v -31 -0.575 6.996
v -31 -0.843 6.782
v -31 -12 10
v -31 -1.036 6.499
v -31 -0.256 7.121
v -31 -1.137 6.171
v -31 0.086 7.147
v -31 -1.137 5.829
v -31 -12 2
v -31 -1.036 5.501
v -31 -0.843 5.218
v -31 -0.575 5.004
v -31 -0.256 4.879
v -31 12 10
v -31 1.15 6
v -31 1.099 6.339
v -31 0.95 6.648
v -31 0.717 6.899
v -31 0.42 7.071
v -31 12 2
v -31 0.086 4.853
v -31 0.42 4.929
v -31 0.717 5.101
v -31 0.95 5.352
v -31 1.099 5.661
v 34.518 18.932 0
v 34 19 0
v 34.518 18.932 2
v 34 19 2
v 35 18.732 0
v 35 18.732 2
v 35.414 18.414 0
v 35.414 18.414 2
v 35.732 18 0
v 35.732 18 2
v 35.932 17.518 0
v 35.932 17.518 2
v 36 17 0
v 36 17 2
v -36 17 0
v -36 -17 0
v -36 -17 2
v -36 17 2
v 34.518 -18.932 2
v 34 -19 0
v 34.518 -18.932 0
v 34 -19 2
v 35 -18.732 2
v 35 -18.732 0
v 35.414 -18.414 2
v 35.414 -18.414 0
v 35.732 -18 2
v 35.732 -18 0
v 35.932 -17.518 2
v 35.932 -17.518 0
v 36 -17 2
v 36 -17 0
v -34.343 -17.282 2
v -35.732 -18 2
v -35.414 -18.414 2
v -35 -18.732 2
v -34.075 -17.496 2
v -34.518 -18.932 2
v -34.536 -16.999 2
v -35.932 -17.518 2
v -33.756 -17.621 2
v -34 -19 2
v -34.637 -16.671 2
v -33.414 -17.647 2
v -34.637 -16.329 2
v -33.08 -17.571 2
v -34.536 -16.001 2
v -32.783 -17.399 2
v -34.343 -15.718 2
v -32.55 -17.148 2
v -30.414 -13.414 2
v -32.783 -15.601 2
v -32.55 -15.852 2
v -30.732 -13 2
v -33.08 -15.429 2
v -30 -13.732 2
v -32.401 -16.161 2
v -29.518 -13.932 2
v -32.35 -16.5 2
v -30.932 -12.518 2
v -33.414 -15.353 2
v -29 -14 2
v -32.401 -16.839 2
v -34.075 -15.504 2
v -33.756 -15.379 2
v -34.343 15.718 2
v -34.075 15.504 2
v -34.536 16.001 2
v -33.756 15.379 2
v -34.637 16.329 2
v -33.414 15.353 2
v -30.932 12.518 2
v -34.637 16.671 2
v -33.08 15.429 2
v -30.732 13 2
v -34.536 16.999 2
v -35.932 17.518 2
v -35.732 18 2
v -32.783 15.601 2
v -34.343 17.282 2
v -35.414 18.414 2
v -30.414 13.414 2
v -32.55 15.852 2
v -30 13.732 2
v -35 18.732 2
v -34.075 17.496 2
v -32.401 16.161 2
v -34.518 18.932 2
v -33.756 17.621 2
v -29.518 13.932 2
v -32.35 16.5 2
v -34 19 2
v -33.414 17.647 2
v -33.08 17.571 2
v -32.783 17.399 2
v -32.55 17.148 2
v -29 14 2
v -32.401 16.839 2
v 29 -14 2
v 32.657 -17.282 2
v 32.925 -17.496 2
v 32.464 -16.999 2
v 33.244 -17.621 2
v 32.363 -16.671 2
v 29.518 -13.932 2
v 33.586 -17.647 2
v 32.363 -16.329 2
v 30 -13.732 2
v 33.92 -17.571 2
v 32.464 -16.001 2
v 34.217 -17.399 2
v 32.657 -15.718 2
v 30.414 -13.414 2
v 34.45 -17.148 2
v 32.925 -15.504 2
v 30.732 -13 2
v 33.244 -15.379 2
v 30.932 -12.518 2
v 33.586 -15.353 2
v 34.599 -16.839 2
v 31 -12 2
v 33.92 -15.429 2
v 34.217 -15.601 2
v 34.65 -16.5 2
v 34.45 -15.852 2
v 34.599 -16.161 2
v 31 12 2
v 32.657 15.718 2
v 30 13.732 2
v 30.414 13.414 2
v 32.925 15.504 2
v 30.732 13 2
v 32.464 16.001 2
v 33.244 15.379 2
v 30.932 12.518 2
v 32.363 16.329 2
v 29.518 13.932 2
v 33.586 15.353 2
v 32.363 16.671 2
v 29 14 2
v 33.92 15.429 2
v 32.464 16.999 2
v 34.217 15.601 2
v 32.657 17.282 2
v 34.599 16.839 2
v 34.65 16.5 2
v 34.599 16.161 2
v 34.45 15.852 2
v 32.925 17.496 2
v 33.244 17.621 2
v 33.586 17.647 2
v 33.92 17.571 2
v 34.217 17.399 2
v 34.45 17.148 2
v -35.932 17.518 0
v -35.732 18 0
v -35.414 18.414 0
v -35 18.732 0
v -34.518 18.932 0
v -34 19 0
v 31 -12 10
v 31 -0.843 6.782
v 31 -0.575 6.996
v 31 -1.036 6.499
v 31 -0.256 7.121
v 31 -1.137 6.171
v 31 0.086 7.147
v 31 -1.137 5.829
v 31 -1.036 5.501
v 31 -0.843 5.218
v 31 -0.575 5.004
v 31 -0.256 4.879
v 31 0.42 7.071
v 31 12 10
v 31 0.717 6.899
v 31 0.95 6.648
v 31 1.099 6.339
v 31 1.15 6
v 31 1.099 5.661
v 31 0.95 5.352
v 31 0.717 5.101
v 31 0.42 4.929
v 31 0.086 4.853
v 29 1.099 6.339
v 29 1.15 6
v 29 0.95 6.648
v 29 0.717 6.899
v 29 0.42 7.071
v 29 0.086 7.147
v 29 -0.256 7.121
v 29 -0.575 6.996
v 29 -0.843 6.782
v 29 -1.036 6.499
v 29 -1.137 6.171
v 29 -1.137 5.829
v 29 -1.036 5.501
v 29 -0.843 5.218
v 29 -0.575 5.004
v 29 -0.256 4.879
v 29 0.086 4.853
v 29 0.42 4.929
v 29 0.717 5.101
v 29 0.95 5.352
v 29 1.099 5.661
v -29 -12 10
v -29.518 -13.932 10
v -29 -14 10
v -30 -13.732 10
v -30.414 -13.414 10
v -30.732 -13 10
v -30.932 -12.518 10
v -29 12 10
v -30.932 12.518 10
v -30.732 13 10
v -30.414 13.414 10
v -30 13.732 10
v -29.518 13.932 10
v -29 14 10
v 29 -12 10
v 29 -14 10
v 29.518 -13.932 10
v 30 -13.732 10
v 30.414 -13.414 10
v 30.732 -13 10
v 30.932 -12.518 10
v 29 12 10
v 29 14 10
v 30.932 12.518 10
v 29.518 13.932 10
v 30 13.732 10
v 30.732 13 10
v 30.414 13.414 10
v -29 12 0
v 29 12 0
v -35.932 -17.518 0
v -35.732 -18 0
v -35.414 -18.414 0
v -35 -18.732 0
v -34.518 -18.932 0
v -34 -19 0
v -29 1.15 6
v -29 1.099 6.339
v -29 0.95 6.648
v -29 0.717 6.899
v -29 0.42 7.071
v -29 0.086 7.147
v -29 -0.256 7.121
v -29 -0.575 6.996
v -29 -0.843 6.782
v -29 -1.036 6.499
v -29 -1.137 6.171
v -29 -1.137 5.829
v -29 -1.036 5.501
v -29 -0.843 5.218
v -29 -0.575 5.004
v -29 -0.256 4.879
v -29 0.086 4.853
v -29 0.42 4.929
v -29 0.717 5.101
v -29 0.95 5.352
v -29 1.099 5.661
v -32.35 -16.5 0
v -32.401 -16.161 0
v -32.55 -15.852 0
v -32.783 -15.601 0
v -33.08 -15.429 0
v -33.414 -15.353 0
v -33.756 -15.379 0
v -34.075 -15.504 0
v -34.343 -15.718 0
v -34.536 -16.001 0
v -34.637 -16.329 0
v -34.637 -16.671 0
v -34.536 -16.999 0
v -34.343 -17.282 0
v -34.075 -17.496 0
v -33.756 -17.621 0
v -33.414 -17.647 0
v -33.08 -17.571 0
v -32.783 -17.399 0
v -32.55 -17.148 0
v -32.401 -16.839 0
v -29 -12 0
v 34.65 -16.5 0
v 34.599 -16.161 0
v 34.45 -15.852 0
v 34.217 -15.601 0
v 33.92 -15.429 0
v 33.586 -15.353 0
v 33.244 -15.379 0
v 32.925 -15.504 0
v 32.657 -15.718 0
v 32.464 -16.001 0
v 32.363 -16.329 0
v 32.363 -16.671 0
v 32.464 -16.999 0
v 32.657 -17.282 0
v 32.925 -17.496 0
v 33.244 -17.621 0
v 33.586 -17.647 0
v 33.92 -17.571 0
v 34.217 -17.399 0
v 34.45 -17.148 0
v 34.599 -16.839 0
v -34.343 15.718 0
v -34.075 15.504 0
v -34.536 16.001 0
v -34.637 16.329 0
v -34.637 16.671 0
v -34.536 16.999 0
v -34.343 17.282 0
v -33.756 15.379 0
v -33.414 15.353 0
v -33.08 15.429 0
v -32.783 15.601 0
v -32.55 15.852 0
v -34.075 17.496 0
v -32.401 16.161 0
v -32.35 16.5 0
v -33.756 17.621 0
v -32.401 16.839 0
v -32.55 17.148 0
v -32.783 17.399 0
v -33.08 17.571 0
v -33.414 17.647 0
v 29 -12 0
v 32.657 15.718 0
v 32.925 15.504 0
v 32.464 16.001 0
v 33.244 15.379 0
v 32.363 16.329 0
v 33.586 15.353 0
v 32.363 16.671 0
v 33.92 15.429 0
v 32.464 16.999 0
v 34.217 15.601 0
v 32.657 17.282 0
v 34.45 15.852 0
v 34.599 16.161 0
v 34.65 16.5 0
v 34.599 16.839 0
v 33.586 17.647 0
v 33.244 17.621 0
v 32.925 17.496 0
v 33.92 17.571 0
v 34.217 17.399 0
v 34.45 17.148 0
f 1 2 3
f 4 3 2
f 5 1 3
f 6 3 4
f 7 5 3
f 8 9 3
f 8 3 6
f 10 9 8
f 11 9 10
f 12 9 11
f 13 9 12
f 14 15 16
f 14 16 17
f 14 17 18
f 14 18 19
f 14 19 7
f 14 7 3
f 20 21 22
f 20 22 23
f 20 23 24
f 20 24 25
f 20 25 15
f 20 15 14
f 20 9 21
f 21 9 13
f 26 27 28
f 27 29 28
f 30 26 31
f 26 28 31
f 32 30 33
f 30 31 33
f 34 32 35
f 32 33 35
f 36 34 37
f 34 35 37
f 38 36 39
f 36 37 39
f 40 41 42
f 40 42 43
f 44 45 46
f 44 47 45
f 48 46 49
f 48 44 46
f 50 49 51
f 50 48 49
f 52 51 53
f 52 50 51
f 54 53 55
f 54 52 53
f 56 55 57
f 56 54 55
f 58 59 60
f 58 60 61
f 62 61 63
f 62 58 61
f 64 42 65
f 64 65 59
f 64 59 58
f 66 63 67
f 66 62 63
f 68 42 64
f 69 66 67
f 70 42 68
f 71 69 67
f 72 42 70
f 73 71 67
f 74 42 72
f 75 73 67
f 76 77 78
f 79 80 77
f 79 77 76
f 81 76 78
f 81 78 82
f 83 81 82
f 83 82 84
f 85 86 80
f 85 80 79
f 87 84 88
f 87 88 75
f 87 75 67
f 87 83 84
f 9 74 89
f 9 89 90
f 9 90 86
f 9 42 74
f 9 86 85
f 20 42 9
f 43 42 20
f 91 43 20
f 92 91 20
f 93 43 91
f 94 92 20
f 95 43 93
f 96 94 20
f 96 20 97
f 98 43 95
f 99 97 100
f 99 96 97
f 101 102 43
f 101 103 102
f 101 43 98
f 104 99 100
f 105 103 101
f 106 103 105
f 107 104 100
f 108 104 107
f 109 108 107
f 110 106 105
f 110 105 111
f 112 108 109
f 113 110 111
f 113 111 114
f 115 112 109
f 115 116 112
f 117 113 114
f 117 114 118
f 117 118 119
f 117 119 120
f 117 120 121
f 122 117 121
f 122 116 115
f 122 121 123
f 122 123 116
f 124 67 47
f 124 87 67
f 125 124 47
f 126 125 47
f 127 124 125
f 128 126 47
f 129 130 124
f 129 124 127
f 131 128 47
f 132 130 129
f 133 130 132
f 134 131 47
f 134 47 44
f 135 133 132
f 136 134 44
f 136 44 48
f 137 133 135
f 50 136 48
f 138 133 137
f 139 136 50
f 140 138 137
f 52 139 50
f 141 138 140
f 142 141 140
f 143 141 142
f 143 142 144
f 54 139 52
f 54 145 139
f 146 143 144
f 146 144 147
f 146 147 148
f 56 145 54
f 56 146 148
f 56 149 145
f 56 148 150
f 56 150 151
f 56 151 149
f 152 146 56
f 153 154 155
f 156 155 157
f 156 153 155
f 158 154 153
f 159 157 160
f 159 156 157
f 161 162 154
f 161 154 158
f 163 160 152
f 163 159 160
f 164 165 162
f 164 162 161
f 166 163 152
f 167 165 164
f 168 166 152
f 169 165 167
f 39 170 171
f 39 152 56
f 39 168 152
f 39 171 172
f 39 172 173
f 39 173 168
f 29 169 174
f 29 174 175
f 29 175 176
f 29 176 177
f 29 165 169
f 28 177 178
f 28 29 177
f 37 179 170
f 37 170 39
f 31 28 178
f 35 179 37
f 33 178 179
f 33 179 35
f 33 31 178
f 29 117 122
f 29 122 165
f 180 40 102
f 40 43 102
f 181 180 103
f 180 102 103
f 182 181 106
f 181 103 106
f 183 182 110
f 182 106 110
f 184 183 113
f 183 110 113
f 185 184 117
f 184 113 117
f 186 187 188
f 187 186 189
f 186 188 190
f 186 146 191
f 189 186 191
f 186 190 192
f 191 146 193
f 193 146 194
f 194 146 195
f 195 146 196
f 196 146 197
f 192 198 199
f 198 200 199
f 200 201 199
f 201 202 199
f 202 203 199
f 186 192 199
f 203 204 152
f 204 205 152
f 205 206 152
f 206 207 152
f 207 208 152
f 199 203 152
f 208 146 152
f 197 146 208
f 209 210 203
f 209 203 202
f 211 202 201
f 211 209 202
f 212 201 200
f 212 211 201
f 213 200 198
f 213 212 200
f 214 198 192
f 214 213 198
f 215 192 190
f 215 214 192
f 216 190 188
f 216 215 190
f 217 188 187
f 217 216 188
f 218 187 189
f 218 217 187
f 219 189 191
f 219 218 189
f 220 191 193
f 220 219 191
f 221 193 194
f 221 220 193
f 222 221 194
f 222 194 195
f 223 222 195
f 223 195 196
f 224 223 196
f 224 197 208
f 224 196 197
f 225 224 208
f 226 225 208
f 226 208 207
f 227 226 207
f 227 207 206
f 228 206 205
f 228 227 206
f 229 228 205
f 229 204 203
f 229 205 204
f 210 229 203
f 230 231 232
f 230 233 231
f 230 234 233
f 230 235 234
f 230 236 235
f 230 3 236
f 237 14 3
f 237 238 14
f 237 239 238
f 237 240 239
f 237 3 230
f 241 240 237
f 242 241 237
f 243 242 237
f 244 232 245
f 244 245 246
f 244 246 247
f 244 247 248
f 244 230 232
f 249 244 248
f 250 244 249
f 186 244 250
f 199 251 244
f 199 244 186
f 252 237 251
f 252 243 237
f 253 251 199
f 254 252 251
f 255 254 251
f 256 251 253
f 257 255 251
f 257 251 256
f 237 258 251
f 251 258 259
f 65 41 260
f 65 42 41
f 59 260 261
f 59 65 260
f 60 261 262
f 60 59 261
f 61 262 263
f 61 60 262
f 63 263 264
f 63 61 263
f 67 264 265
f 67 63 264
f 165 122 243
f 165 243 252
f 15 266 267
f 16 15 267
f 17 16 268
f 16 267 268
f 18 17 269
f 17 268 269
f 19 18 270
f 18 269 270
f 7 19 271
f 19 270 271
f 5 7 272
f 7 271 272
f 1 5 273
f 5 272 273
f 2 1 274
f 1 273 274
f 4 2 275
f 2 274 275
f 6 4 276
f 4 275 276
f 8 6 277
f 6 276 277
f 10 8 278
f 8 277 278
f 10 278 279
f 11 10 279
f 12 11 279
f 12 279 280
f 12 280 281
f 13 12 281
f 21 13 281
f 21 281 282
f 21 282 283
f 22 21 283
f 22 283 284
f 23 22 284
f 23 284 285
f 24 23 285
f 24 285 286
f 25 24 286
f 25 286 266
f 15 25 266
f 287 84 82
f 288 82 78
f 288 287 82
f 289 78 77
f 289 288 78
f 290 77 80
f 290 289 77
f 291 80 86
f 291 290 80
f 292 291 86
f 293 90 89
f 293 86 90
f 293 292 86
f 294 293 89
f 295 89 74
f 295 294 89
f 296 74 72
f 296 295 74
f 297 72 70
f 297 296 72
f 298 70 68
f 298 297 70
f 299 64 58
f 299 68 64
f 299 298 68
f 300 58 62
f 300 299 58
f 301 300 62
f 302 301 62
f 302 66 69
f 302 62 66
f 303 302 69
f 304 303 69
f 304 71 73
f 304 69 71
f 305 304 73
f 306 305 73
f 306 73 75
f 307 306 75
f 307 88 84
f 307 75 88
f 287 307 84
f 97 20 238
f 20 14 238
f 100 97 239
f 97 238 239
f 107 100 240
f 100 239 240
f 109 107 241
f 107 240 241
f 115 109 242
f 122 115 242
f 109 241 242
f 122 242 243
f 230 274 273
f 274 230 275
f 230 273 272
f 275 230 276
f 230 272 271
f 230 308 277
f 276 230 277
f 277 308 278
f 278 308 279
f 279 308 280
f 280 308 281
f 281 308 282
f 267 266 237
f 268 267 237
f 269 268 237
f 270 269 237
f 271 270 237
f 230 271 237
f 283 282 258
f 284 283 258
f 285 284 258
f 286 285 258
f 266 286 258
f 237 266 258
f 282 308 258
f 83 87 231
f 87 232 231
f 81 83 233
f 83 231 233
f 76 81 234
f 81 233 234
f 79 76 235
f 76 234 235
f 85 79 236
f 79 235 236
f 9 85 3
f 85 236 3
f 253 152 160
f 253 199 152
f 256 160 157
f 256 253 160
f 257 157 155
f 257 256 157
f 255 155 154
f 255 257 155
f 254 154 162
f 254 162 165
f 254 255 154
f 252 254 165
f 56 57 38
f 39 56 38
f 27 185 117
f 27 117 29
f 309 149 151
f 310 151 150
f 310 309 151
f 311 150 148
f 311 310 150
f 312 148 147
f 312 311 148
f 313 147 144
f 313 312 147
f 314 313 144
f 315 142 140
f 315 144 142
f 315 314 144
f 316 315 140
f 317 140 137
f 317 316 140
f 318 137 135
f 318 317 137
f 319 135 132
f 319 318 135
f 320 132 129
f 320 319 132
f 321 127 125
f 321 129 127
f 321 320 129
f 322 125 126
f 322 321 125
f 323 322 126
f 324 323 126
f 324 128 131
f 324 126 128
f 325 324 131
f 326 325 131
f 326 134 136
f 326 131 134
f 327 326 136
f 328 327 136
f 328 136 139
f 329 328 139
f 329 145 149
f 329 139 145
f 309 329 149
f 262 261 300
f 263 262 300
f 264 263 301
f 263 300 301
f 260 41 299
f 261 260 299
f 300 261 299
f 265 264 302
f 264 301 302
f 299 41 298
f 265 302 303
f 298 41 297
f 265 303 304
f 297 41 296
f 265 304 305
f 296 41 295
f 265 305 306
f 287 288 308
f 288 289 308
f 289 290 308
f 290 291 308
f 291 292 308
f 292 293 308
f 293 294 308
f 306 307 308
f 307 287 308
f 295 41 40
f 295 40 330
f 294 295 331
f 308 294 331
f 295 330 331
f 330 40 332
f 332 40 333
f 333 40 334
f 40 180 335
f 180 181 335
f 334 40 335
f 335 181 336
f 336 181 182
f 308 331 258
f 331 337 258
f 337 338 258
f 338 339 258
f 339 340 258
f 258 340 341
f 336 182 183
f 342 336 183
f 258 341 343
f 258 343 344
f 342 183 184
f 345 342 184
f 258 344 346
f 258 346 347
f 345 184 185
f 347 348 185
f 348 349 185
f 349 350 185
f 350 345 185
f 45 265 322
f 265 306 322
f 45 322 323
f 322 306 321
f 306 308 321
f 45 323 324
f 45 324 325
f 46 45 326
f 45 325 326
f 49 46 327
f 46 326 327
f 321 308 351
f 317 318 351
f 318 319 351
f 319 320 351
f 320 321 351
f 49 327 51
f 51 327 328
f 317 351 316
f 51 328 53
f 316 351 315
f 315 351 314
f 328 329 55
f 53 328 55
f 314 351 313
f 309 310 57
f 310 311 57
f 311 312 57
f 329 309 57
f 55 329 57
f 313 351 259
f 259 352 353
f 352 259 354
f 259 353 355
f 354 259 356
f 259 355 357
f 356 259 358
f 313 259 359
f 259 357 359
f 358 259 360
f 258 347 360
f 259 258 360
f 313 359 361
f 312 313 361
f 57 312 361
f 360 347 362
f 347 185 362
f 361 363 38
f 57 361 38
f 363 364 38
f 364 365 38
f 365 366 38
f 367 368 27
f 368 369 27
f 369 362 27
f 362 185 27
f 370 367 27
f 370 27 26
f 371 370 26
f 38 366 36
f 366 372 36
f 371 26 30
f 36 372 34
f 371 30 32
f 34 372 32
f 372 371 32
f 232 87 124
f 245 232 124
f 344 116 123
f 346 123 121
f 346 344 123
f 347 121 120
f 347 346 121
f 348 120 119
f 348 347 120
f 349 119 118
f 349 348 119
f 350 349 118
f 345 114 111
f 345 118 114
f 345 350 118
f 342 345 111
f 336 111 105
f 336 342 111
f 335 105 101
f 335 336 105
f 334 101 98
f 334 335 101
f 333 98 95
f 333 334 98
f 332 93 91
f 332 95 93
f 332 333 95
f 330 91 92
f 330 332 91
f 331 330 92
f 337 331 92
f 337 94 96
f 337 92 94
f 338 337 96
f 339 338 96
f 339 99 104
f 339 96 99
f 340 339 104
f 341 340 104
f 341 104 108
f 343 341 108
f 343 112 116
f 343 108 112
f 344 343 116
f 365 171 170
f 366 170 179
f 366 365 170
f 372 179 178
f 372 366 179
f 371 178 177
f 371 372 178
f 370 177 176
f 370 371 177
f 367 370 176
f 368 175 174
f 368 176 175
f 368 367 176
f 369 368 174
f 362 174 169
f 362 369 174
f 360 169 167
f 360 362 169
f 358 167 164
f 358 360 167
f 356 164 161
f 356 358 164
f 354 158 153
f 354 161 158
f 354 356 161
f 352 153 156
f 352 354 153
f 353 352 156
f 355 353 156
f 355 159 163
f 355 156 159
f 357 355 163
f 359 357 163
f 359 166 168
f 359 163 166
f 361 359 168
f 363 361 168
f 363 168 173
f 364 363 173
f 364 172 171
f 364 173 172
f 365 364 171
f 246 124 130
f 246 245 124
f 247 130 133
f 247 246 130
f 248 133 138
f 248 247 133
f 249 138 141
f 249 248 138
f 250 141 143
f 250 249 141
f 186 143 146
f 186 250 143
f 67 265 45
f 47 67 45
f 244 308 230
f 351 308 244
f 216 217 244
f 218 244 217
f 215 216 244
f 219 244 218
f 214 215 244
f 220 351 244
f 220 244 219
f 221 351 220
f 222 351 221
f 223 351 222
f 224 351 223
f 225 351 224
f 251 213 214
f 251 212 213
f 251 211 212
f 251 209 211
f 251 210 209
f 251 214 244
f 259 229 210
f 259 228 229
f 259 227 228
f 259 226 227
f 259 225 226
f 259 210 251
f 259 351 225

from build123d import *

# Parameters (mm, degrees)
SKETCH_W             = 62
SKETCH_H             = 28
SKETCH_W_2           = 58
SKETCH_H_2           = 24
PAD_DEPTH            = 10
SKETCH001_W          = 72
SKETCH001_H          = 38
SKETCH001_W_2        = 62
SKETCH001_H_2        = 28
PAD001_DEPTH         = 2
SKETCH002_R          = 1.15
POCKET_DEPTH         = 0.001
POCKET_DEPTH_BACK    = -10.001
SKETCH003_R          = 1.15
POCKET001_DEPTH      = 36.001
POCKET001_DEPTH_BACK = -36.001
FILLET_R             = 2


with BuildPart() as part:
    # Sketch → Pad (new body)
    with BuildSketch(Plane.XY):
        Rectangle(SKETCH_W, SKETCH_H)
        Rectangle(SKETCH_W_2, SKETCH_H_2, mode=Mode.SUBTRACT)
    extrude(amount=PAD_DEPTH)

    # Sketch001 → Pad001 (join)
    with BuildSketch(Plane.XY):
        Rectangle(SKETCH001_W, SKETCH001_H)
        Rectangle(SKETCH001_W_2, SKETCH001_H_2, mode=Mode.SUBTRACT)
    extrude(amount=PAD001_DEPTH)

    # Sketch002 → Pocket (cut, two sides)
    with BuildSketch(Plane.XY) as pocket_sk:
        with Locations((-33.5, 16.5)):
            Circle(SKETCH002_R)
        with Locations((33.5, 16.5)):
            Circle(SKETCH002_R)
        with Locations((33.5, -16.5)):
            Circle(SKETCH002_R)
        with Locations((-33.5, -16.5)):
            Circle(SKETCH002_R)
    extrude(amount=-POCKET_DEPTH, mode=Mode.SUBTRACT)
    extrude(pocket_sk.sketch, amount=-POCKET_DEPTH_BACK, mode=Mode.SUBTRACT)

    # Sketch003 → Pocket001 (cut, two sides)
    with BuildSketch(Plane.YZ) as pocket001_sk:
        with Locations((0, 6)):
            Circle(SKETCH003_R)
    extrude(amount=-POCKET001_DEPTH, mode=Mode.SUBTRACT)
    extrude(pocket001_sk.sketch, amount=-POCKET001_DEPTH_BACK, mode=Mode.SUBTRACT)

    # Fillet
    fillet_edges = [part.edges().sort_by_distance(p)[0] for p in [
        (-36, 19, 1),
        (-36, -19, 1),
        (36, -19, 1),
        (36, 19, 1),
        (31, 14, 6),
        (31, -14, 6),
        (-31, 14, 6),
        (-31, -14, 6),
    ]]
    fillet(fillet_edges, radius=FILLET_R)


solid = part.part
